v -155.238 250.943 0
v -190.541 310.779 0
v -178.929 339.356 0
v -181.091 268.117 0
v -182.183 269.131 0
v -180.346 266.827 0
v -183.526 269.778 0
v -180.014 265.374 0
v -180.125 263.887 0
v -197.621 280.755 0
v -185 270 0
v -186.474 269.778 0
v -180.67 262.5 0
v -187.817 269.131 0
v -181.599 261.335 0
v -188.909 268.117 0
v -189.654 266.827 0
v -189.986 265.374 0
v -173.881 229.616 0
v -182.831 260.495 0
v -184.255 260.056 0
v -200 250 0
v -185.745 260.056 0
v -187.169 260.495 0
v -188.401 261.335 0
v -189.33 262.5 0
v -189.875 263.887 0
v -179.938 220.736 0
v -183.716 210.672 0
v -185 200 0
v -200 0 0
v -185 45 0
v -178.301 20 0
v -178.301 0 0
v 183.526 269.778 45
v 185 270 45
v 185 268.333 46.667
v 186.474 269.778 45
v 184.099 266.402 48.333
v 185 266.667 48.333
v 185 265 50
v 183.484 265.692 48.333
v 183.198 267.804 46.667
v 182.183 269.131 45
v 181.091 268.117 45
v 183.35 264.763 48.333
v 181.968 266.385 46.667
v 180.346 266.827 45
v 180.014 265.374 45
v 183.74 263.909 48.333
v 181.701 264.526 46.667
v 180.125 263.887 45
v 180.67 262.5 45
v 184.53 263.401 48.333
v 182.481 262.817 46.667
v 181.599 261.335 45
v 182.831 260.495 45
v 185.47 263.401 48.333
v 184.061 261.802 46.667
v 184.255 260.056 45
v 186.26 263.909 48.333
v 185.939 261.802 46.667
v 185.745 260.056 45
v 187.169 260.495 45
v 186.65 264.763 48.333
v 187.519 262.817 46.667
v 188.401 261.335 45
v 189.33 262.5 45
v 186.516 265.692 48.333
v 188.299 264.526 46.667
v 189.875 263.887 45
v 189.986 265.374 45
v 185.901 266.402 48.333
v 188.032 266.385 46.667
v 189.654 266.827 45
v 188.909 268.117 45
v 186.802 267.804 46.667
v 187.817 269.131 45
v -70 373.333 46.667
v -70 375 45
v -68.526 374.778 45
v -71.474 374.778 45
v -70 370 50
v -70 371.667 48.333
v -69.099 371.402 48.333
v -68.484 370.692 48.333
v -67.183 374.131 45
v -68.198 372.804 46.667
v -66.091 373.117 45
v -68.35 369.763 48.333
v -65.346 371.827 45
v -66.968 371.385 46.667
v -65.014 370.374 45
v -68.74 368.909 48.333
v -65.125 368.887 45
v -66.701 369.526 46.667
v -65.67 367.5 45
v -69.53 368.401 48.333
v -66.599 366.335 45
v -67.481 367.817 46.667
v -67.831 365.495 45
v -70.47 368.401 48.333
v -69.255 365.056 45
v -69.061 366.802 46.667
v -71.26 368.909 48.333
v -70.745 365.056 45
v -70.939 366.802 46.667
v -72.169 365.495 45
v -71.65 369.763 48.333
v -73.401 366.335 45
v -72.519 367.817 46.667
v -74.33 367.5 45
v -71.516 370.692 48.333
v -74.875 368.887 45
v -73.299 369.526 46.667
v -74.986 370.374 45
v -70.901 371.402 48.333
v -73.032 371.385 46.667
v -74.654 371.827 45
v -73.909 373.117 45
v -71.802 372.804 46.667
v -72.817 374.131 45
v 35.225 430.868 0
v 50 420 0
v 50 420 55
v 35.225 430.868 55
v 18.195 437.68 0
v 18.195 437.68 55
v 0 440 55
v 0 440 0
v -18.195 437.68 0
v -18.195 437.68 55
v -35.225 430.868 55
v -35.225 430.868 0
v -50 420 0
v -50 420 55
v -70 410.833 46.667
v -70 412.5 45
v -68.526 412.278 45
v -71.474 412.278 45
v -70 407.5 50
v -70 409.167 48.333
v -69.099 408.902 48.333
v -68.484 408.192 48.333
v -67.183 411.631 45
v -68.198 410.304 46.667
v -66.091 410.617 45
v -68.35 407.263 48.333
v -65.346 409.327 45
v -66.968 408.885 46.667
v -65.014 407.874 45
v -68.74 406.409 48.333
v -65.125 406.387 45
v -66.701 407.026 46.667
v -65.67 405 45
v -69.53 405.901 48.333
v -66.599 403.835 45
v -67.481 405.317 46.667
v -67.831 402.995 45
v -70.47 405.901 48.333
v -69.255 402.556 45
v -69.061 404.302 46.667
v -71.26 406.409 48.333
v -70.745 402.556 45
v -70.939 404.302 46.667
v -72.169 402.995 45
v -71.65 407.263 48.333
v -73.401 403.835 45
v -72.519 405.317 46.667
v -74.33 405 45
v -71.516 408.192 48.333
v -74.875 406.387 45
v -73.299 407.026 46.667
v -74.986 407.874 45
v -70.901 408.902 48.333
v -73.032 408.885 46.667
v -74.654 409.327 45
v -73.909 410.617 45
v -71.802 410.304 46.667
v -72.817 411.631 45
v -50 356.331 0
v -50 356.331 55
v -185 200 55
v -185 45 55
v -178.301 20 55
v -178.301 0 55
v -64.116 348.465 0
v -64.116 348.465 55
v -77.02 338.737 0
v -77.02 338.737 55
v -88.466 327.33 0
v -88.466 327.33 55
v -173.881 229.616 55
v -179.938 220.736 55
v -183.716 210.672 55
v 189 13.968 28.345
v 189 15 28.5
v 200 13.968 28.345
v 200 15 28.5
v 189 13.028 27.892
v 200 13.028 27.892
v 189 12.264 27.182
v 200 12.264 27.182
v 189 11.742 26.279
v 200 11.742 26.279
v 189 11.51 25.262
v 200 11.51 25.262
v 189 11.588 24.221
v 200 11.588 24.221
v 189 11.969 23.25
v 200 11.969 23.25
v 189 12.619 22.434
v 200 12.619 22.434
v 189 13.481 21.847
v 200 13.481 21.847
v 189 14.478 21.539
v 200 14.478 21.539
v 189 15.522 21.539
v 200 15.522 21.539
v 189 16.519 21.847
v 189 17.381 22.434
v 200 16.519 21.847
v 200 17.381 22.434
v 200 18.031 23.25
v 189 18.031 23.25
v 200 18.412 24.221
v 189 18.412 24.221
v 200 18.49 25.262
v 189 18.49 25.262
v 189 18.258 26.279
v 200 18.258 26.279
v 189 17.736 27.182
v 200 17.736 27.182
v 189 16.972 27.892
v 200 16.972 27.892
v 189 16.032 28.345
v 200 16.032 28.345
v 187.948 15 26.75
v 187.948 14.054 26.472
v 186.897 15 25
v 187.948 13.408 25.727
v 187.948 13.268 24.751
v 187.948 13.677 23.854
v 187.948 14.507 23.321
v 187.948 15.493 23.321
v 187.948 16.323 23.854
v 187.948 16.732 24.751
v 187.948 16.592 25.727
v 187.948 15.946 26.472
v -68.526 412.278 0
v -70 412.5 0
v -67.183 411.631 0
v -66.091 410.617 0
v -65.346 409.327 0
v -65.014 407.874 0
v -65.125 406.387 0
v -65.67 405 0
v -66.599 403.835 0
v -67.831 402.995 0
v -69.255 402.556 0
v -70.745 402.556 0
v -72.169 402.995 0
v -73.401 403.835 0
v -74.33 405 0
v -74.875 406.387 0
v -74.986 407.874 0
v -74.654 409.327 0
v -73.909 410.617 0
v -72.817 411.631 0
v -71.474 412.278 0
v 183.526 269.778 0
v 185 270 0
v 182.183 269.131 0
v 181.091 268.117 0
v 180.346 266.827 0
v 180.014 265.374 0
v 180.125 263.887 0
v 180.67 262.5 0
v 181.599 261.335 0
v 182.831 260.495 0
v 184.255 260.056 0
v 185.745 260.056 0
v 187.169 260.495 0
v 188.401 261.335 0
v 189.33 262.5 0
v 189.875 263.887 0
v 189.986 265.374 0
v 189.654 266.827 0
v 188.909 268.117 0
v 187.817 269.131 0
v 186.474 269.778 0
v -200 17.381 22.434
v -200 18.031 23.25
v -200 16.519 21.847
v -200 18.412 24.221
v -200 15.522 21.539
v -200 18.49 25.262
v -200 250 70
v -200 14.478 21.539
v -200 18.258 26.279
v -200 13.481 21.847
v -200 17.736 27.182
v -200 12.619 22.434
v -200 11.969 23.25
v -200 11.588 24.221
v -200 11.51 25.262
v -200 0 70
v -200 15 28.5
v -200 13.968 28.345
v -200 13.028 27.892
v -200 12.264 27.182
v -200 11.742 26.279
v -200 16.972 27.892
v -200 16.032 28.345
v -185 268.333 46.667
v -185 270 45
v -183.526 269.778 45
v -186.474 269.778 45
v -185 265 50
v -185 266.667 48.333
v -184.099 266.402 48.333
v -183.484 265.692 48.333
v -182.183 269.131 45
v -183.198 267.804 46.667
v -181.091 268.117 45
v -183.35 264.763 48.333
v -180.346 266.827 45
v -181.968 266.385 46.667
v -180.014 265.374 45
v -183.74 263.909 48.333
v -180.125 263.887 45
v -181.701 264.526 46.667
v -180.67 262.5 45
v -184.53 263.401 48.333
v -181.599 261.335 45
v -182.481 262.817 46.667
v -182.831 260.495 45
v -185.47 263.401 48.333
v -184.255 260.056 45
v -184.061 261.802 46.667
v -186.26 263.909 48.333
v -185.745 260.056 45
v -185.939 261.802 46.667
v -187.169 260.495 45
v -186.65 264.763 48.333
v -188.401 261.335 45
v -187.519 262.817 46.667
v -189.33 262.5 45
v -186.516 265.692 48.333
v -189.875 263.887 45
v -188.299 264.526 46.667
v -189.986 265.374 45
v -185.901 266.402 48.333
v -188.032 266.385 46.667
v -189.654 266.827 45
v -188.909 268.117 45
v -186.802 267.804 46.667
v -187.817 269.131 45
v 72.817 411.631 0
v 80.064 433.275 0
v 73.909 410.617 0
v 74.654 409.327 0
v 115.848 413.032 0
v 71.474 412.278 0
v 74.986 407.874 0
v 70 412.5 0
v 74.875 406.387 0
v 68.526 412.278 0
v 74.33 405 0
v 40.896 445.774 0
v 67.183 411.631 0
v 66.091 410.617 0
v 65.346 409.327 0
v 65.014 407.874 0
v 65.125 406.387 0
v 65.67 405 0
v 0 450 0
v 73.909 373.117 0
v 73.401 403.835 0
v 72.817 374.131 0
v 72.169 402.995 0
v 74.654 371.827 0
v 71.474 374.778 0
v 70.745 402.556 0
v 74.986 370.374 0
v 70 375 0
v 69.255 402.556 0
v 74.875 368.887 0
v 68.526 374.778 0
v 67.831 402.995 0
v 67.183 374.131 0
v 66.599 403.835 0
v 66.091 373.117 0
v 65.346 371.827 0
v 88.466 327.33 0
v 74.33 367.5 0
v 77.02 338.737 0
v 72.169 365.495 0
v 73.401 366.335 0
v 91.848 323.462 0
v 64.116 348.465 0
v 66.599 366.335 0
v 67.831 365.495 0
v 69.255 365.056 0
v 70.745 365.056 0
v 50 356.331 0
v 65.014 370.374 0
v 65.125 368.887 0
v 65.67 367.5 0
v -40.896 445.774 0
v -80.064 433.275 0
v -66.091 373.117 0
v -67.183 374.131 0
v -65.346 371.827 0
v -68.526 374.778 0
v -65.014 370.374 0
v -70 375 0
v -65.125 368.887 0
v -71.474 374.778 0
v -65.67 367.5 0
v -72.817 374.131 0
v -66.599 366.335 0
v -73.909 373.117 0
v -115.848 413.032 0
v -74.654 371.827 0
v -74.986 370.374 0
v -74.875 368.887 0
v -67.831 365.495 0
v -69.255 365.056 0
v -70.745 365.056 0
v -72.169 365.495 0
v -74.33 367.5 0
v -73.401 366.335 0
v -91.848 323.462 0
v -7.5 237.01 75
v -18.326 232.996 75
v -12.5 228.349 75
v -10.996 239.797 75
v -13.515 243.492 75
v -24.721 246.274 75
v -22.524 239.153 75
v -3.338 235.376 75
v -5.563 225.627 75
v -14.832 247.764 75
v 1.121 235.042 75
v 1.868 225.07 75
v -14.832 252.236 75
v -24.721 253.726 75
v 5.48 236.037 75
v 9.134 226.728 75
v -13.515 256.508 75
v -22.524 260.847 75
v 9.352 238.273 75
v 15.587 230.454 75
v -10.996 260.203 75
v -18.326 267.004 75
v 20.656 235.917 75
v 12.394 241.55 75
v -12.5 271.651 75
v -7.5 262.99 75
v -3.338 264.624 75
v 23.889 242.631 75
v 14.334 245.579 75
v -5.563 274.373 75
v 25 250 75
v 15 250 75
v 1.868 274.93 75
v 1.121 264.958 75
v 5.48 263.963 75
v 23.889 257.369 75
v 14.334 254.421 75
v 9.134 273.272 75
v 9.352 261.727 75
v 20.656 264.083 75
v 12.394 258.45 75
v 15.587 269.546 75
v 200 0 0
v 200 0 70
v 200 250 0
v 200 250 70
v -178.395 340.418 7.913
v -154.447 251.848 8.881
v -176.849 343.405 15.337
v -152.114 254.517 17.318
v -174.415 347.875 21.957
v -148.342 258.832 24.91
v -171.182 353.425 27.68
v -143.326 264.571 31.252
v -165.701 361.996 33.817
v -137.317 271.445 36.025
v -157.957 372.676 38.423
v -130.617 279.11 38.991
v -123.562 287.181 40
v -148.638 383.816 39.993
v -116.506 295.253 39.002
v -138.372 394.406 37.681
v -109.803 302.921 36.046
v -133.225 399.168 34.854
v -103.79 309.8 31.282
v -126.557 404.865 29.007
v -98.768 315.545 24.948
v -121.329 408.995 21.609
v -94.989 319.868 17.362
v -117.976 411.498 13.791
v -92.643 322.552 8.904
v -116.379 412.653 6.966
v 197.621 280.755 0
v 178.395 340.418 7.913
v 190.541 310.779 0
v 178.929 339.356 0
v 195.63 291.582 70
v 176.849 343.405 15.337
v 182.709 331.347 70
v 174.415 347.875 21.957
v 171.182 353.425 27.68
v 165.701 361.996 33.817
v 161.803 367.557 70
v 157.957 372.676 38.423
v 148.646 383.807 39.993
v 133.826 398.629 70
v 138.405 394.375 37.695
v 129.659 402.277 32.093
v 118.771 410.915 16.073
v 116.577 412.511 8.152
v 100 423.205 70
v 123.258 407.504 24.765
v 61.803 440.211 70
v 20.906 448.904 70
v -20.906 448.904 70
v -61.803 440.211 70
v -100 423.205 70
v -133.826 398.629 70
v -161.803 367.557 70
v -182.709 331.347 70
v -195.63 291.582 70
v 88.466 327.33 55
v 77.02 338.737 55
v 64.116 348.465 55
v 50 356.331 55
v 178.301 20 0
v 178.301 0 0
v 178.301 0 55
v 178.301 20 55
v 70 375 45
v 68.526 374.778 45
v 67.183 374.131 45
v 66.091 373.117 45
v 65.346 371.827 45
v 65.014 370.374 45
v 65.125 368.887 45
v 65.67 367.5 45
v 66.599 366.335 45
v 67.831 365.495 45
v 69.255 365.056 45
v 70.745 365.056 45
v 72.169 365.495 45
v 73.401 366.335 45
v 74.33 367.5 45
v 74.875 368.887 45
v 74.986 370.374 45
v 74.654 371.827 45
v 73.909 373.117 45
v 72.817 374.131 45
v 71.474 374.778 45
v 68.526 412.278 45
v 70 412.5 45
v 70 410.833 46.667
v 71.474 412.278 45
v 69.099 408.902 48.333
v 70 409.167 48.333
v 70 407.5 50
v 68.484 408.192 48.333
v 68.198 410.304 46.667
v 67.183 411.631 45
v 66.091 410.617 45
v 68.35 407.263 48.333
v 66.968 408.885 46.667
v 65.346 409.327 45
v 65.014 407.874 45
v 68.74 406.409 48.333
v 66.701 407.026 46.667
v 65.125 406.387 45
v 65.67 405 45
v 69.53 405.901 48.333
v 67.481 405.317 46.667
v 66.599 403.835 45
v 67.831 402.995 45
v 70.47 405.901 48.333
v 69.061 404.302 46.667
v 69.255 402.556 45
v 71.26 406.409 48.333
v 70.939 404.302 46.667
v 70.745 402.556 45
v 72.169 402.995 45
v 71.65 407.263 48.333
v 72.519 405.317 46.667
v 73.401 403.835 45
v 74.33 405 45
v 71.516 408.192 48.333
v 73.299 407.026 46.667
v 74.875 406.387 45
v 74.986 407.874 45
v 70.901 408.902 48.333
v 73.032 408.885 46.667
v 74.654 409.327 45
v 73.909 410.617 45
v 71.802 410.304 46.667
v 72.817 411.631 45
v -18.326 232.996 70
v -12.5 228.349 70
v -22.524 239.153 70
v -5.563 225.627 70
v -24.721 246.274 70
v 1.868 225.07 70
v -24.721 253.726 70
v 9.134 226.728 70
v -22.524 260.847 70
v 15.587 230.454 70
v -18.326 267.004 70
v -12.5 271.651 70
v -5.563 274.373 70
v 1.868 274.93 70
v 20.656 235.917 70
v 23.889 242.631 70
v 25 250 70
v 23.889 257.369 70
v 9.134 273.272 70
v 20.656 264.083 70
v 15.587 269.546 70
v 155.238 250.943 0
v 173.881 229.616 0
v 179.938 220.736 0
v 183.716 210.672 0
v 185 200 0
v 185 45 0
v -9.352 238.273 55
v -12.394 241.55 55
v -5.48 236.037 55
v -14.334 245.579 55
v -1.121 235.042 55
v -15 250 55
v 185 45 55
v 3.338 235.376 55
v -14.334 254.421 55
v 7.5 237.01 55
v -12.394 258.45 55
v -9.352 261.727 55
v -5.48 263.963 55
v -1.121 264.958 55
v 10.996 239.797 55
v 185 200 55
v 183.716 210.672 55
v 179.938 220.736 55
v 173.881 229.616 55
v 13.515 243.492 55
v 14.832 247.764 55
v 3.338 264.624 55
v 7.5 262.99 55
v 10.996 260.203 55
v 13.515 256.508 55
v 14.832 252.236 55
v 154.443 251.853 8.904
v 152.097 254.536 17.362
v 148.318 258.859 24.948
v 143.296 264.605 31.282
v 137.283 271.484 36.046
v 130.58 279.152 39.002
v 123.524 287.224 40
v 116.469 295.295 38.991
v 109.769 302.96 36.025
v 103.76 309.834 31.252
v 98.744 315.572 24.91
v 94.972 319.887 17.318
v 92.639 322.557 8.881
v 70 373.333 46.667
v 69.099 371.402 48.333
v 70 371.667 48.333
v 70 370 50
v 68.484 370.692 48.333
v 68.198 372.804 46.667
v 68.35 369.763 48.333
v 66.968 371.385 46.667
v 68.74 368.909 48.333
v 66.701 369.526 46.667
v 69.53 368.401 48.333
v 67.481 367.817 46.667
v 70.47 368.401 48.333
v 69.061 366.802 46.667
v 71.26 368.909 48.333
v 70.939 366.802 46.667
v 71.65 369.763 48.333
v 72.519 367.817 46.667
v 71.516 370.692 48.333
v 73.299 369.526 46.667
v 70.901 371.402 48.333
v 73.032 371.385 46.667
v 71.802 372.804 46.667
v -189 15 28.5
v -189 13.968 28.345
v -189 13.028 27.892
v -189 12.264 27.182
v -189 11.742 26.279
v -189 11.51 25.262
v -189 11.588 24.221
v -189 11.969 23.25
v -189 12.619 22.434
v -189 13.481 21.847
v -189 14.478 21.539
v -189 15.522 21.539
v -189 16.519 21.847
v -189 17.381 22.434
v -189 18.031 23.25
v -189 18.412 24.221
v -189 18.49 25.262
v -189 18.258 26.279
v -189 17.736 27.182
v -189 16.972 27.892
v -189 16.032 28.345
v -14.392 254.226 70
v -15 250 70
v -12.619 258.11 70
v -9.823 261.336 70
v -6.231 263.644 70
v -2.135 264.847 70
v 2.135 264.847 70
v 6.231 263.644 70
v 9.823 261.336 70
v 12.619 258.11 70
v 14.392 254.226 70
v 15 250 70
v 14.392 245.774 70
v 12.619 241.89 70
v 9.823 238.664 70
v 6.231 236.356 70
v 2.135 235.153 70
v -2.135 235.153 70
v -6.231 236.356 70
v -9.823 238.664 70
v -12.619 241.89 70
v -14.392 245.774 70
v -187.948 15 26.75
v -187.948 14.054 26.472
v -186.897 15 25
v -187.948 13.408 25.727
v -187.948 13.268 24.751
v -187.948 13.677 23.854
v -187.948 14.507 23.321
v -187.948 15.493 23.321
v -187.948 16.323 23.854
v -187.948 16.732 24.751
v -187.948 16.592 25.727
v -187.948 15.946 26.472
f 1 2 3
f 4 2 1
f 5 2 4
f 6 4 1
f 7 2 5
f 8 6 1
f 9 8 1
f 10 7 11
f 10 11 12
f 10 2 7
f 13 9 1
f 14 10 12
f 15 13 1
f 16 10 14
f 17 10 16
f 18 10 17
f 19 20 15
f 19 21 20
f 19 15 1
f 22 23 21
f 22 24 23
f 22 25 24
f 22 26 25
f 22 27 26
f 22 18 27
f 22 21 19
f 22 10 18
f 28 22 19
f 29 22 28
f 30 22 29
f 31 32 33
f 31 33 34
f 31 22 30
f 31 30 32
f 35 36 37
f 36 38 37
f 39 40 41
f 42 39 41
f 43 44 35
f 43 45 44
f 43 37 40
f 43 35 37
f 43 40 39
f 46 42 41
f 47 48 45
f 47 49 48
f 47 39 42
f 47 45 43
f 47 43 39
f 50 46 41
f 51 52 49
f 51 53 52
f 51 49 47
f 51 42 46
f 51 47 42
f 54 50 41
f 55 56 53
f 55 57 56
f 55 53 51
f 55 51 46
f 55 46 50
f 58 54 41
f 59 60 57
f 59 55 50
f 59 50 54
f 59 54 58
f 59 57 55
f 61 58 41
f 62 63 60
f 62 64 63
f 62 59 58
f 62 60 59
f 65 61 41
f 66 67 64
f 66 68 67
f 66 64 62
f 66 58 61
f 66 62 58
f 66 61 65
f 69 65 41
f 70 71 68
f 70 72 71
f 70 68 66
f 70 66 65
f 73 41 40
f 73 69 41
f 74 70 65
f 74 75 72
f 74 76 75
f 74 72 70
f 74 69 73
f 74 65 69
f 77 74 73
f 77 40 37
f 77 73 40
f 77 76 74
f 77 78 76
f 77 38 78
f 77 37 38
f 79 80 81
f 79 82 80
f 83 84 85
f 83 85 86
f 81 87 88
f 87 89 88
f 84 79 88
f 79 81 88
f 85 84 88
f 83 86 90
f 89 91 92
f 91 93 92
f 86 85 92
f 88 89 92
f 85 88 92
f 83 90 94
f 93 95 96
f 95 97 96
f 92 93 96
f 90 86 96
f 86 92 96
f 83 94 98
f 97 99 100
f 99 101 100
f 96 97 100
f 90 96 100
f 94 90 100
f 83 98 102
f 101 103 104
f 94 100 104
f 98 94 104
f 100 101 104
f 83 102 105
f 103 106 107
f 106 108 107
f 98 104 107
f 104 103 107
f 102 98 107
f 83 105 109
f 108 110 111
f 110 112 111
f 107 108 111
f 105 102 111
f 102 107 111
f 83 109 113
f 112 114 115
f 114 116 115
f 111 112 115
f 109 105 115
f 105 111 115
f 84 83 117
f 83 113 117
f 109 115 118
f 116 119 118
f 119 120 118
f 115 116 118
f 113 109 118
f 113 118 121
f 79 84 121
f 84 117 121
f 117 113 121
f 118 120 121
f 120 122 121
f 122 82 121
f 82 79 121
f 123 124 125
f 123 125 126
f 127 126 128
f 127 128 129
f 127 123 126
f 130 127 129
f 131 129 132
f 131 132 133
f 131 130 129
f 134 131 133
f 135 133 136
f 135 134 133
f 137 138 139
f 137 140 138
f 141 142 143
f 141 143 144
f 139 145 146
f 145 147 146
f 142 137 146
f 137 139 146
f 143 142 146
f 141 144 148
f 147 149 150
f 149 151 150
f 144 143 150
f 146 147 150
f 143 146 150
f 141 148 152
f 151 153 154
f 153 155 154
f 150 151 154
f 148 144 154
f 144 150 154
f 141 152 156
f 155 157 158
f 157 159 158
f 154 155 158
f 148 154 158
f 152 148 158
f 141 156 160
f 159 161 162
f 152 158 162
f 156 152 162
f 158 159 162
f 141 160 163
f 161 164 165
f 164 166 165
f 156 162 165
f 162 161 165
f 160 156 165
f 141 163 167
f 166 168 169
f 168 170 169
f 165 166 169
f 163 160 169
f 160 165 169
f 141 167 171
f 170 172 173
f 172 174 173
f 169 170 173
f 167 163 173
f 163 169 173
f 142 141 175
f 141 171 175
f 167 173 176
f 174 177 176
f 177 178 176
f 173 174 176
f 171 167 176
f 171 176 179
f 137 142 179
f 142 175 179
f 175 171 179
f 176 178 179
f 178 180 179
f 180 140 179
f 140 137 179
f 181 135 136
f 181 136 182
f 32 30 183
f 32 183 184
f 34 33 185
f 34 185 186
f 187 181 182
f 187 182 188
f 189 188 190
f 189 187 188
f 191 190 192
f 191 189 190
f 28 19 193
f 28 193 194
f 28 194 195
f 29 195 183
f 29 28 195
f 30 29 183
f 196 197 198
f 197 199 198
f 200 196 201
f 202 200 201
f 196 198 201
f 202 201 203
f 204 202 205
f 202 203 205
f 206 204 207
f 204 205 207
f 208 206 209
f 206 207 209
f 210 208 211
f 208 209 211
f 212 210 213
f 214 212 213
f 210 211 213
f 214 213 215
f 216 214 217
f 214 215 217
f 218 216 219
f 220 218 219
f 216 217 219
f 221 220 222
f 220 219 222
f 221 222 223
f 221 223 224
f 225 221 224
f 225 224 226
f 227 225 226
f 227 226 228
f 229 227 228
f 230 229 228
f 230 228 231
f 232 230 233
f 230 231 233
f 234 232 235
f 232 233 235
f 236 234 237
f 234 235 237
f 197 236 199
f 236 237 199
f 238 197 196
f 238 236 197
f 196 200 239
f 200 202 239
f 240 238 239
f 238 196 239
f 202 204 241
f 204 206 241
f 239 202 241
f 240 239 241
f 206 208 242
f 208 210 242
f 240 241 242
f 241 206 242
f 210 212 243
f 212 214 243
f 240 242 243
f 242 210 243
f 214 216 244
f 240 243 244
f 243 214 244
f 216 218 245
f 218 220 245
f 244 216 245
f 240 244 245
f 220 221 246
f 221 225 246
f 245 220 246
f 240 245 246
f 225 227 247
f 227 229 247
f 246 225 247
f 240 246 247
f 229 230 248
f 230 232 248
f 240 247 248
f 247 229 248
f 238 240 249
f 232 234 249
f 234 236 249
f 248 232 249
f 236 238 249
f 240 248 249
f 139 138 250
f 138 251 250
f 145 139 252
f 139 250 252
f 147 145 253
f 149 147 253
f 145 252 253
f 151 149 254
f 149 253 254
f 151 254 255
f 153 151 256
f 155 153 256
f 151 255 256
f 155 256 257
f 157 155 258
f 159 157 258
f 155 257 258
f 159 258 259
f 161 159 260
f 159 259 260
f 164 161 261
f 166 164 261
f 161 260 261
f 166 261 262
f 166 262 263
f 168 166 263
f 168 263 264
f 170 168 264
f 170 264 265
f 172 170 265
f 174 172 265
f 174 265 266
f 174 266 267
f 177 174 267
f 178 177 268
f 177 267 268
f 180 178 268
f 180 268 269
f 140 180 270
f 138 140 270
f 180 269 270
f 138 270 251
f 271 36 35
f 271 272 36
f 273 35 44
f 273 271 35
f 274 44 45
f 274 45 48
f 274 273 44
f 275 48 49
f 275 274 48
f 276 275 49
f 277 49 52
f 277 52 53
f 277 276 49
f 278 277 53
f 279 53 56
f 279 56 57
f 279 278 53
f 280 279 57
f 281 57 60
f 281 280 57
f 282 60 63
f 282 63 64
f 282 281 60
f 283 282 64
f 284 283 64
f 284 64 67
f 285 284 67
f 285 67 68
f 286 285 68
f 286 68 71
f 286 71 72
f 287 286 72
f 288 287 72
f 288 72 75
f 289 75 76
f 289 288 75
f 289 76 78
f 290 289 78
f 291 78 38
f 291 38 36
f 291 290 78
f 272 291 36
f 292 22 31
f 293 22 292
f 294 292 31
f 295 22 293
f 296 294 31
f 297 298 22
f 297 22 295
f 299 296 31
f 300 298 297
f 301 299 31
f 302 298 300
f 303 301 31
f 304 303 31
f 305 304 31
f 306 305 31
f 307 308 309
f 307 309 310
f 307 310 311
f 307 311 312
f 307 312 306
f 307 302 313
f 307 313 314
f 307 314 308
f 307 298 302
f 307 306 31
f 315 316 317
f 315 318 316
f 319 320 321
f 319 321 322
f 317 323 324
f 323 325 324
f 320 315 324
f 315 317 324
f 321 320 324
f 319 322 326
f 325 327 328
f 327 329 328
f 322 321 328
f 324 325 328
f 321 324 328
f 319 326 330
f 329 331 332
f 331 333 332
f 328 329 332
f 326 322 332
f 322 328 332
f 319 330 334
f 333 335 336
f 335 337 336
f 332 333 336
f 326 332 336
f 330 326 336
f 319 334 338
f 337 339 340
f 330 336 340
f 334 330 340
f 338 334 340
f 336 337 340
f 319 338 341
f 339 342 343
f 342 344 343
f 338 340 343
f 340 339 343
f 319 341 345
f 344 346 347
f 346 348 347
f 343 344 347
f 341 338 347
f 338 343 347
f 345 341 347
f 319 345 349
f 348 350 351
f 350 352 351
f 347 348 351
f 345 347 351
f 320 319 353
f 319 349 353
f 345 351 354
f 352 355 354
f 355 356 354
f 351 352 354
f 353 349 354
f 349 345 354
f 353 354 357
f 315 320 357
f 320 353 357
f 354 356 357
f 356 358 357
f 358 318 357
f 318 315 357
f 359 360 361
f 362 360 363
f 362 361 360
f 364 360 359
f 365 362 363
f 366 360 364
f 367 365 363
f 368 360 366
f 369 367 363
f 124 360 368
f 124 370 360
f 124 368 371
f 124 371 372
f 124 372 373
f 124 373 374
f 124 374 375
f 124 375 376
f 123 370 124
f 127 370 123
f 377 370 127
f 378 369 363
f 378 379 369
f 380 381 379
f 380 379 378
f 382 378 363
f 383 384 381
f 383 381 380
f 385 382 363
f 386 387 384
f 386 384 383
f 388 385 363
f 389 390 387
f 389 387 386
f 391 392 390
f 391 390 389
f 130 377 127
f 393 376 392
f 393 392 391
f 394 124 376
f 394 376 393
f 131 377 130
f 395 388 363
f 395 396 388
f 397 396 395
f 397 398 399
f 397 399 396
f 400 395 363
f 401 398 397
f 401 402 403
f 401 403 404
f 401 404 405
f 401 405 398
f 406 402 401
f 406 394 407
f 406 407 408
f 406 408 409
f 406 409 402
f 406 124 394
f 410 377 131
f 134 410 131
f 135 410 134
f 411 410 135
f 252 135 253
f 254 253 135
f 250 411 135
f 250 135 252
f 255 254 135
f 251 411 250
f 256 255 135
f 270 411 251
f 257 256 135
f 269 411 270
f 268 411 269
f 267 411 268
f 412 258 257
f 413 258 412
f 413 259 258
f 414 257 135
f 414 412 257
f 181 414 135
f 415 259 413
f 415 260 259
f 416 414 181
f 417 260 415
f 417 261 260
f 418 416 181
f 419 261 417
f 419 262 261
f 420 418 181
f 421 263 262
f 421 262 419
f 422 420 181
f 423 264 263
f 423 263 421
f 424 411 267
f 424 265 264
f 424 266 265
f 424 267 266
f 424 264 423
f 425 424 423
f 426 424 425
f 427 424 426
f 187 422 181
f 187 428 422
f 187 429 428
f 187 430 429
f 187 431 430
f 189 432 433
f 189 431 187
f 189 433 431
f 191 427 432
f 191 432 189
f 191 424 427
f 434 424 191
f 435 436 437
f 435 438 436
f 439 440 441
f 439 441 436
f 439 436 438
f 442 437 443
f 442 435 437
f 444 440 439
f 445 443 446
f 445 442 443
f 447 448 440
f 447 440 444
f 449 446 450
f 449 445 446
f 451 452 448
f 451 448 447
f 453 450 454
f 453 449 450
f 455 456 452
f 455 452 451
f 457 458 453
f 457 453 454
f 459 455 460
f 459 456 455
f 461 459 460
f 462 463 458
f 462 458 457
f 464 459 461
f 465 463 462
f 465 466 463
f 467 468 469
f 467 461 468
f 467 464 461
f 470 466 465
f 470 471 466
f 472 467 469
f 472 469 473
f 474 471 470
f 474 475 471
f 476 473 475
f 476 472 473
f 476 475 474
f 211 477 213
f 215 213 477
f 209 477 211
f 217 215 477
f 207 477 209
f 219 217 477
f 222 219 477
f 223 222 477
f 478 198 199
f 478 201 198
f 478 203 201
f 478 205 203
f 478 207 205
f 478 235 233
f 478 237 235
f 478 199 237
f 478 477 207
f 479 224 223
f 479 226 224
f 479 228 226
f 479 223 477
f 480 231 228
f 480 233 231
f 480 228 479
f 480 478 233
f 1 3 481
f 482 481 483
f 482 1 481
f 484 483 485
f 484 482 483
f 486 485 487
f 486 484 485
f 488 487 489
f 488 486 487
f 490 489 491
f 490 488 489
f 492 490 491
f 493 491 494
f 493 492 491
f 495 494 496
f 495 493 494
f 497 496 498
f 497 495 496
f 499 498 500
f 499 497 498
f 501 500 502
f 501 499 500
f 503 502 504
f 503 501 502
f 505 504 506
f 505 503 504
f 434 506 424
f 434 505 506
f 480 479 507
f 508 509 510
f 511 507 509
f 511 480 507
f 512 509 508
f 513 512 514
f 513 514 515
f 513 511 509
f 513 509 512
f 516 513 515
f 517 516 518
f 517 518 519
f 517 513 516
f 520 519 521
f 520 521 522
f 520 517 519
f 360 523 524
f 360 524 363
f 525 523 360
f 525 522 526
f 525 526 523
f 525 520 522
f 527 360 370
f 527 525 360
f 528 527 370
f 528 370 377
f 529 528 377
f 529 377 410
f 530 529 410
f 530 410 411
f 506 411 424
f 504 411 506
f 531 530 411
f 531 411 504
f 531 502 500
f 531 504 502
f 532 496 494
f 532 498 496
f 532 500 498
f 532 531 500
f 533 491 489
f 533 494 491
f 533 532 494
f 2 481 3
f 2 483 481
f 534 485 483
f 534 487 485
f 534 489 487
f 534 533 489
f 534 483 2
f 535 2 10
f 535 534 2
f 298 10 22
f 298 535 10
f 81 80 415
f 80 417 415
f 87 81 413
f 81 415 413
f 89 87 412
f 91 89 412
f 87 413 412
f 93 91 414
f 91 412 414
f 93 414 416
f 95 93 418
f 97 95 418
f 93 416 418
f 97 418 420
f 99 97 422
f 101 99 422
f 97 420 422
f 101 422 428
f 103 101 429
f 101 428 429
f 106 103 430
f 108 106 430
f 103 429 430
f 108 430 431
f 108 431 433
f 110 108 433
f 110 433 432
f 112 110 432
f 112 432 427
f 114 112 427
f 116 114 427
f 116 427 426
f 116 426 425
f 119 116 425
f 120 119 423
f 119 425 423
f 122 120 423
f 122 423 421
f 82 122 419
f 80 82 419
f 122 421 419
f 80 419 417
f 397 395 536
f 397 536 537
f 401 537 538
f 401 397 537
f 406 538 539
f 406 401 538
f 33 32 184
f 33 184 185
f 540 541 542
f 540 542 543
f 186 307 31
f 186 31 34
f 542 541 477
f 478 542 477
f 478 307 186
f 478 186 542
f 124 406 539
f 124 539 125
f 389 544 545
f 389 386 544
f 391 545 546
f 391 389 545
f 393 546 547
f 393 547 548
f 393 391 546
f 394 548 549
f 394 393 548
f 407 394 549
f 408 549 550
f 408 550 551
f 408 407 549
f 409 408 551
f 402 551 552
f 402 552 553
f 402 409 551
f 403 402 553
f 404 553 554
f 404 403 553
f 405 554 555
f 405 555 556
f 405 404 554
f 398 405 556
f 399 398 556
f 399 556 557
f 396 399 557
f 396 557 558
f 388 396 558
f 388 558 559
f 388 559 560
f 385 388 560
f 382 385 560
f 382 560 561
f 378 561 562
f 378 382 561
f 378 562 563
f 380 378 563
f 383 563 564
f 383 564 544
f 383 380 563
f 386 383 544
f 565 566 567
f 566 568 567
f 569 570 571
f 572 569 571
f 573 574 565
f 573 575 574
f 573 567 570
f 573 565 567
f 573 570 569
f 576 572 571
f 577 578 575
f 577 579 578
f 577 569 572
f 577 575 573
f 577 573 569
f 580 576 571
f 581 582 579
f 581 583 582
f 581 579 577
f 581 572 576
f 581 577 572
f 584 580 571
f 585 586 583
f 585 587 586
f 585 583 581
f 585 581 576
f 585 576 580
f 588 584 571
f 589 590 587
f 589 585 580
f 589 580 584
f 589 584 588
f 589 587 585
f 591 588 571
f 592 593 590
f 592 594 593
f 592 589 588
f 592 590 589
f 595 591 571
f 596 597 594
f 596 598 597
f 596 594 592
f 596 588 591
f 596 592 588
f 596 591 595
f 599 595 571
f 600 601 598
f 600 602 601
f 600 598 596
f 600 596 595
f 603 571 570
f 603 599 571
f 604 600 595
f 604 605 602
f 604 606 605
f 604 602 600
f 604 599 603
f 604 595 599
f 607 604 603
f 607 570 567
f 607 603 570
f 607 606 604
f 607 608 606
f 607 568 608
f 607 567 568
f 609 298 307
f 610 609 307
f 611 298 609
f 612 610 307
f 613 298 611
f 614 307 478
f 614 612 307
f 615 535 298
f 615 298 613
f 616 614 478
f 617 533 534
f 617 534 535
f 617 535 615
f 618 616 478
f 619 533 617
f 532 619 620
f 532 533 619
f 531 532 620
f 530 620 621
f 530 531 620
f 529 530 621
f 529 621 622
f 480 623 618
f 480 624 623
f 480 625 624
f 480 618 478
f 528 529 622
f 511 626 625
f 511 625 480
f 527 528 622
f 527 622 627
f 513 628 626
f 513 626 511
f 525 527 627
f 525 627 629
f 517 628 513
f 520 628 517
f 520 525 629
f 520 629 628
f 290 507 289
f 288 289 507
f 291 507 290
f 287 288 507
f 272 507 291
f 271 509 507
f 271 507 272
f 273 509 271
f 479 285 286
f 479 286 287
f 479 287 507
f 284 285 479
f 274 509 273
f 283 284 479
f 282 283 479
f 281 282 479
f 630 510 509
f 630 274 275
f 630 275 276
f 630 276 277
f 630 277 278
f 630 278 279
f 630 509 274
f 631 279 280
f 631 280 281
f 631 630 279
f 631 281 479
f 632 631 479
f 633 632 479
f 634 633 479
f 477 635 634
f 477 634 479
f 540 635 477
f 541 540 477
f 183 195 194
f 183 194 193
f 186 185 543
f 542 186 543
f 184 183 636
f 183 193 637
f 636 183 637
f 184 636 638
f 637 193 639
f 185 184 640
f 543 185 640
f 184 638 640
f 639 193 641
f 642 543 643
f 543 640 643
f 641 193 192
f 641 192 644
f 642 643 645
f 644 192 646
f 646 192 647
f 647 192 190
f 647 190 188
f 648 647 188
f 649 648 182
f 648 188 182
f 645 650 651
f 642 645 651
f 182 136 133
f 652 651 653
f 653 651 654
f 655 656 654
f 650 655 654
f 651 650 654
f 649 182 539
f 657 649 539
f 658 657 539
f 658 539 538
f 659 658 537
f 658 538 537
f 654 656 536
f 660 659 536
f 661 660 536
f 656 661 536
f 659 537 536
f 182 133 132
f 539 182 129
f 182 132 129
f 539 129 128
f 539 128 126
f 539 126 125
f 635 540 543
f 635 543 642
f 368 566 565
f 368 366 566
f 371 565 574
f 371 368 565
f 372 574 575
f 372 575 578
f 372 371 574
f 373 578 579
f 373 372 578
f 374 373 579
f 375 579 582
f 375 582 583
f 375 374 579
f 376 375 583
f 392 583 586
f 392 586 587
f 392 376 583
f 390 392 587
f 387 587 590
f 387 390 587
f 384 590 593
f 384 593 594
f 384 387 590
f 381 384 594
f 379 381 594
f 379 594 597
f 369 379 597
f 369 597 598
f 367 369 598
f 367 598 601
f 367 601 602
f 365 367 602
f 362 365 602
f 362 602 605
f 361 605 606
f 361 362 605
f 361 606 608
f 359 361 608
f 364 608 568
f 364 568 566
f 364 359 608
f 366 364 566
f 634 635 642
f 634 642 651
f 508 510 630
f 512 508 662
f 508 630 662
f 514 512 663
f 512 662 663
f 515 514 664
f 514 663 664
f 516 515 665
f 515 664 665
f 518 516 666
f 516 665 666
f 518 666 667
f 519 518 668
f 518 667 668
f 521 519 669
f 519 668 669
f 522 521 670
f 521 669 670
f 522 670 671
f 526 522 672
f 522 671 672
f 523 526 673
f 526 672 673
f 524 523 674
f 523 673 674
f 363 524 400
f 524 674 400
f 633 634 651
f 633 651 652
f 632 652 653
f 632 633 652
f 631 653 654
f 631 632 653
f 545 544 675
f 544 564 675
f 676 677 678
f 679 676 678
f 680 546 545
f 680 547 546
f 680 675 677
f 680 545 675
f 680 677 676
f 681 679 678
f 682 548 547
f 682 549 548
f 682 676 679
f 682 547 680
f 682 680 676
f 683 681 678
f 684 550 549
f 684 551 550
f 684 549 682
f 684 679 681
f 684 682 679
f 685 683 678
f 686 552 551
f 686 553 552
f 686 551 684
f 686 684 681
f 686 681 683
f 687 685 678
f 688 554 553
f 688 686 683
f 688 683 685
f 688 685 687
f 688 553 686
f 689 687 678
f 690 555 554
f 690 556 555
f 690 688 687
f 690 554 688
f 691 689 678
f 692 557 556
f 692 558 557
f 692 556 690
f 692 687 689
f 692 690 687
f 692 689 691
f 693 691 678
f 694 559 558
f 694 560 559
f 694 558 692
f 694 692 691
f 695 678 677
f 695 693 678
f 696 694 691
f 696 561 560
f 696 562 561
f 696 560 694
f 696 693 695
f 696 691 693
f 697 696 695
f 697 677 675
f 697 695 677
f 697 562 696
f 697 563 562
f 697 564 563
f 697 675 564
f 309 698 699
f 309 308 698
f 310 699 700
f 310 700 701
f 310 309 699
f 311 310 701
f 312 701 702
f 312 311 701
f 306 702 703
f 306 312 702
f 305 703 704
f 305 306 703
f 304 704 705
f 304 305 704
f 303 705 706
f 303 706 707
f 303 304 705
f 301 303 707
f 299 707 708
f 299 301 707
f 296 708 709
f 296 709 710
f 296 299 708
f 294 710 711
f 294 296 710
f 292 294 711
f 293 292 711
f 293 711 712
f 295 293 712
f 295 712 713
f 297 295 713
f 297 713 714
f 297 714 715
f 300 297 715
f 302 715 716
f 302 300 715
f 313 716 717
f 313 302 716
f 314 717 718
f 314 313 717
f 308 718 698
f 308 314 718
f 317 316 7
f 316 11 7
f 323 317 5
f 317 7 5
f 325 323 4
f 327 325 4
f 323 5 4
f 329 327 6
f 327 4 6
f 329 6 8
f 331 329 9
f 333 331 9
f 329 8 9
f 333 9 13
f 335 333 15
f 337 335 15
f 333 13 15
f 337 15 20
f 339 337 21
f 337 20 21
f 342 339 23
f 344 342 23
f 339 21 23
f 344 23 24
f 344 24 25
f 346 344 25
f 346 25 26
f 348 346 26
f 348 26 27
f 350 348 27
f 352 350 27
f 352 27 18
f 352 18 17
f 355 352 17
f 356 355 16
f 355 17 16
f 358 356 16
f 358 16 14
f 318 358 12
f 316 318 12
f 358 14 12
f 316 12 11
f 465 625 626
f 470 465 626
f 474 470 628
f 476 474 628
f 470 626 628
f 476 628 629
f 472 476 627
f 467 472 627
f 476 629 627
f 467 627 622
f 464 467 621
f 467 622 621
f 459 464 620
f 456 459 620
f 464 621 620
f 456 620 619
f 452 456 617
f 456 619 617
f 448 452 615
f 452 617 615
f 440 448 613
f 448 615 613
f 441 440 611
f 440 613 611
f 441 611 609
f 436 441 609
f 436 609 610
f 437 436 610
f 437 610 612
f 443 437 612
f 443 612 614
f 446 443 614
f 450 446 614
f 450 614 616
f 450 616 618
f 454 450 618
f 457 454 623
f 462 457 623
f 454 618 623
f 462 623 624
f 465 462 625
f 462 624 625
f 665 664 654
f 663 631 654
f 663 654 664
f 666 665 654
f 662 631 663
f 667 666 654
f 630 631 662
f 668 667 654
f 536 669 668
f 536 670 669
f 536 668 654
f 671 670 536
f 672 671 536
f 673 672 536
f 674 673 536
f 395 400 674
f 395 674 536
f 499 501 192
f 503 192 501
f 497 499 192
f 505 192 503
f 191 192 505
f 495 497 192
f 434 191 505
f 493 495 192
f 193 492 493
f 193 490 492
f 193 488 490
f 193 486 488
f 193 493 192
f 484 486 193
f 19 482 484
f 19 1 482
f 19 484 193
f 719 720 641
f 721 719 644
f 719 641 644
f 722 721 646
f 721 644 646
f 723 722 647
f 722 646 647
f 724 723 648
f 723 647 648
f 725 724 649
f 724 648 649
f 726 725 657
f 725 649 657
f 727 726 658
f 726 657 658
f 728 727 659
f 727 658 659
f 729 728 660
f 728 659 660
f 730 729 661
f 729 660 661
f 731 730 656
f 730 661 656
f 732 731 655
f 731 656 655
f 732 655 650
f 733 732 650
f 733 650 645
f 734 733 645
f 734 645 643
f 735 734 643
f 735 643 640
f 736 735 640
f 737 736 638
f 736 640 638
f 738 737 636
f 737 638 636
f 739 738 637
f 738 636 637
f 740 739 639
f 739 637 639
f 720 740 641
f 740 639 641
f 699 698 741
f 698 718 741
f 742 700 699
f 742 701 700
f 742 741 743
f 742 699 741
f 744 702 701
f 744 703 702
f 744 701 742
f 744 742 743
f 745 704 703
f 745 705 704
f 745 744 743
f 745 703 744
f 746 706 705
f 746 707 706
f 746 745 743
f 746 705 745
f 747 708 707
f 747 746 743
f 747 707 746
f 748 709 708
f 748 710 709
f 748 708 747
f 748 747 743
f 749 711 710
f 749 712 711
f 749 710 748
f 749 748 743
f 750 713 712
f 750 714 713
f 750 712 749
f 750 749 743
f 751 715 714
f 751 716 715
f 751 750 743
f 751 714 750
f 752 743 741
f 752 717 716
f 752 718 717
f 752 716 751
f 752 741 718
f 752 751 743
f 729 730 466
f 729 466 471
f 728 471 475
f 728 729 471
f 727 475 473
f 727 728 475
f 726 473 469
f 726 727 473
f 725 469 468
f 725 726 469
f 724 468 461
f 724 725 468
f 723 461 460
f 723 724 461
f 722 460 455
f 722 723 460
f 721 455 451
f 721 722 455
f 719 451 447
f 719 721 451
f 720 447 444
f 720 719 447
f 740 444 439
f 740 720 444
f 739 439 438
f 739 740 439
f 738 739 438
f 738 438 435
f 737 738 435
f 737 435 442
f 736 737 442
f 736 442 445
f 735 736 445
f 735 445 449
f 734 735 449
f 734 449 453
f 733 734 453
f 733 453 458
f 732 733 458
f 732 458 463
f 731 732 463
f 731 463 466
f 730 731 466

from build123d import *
from build123d.topology import SkipClean

# Parameters (mm, degrees)
BOSS_EXTRUDE4_DEPTH             = 70
F_1_0MM_DOWEL_HOLE1_D           = 30
SKETCH4_R                       = 25
SKETCH4_R_2                     = 15
BOSS_EXTRUDE5_DEPTH             = 5
CUT_EXTRUDE4_DEPTH              = 499.121471129
CUT_EXTRUDE4_DEPTH_BACK         = 499.121471129
CUT_EXTRUDE5_DEPTH              = 55
F_10_0MM_DOWEL_HOLE1_AT_2_COUNT = 2
F_10_0MM_DOWEL_HOLE1_AT_2_PITCH = 155.724133524
F_10_0MM_DOWEL_HOLE1_AT_3_COUNT = 2
F_10_0MM_DOWEL_HOLE1_AT_3_PITCH = 183.115416505
CUT_EXTRUDE6_REACH              = 547.552
SKETCH22_R                      = 40


with BuildPart() as part:
    # Sketch2 → Boss-Extrude4 (new, symmetric)
    with BuildSketch(Plane.XY):
        with BuildLine():
            Line((-200, 0), (200, 0))
            Line((200, 0), (200, 250))
            ThreePointArc((200, 250), (0, 450), (-200, 250))
            Line((-200, 250), (-200, 0))
        make_face()
    extrude(amount=BOSS_EXTRUDE4_DEPTH, both=True)

    # Ø1.0mm Dowel Hole1 (through all)
    with Locations(Plane(origin=(0, 250, 70), x_dir=(1, 0, 0), z_dir=(0, 0, 1))):
        with Locations((0, 0)):
            Hole(F_1_0MM_DOWEL_HOLE1_D / 2)

    # Sketch4 → Boss-Extrude5 (add)
    with SkipClean():  # the faces are left unmerged after this step: merging them gives an invalid solid
        with BuildSketch(Plane.XY.offset(70)):
            with Locations((0, 250)):
                Circle(SKETCH4_R)
            with Locations((0, 250)):
                Circle(SKETCH4_R_2, mode=Mode.SUBTRACT)
        extrude(amount=BOSS_EXTRUDE5_DEPTH)
    add(part.part.scale(1), mode=Mode.REPLACE)  # the faces are merged on a copy

    # Sketch13 → Cut-Extrude4 (cut, two sides: drawn at the far end of the back side and taken through both)
    with BuildSketch(Plane(origin=(0, 0, 0), x_dir=(0, 0, -1), z_dir=(1, 0, 0)).offset(-CUT_EXTRUDE4_DEPTH_BACK)):
        Polygon((0, -922.414379545), (0, 0), (0, 450), (0, 1372.414379545), (1844.828759089, 1372.414379545), (1844.828759089, -922.414379545), align=None)
    extrude(amount=CUT_EXTRUDE4_DEPTH + CUT_EXTRUDE4_DEPTH_BACK, mode=Mode.SUBTRACT)

    # Sketch14 → Cut-Extrude5 (cut)
    with BuildSketch(Plane(origin=(0, 0, 0), x_dir=(-1, 0, 0), z_dir=(0, 0, -1))):
        with BuildLine():
            Line((-185, 45), (-185, 200))
            ThreePointArc((-185, 200), (-182.128554255, 215.817234791), (-173.880670381, 229.615877068))
            Line((-173.880670381, 229.615877068), (-88.466194885, 327.330345677))
            ThreePointArc((-88.466194885, 327.330345677), (-70.735263863, 343.823091221), (-49.999974949, 356.330863371))
            Line((-49.999974949, 356.330863371), (-49.999974949, 420.000023858))
            ThreePointArc((-49.999974949, 420.000023858), (0, 440), (49.999974949, 420.000023858))
            Line((49.999974949, 420.000023858), (49.999974949, 356.330863371))
            ThreePointArc((49.999974949, 356.330863371), (70.735263863, 343.823091221), (88.466194885, 327.330345677))
            Line((88.466194885, 327.330345677), (173.880670381, 229.615877068))
            ThreePointArc((173.880670381, 229.615877068), (182.128554255, 215.817234791), (185, 200))
            Line((185, 200), (185, 45))
            Line((185, 45), (178.301270189, 20))
            Line((178.301270189, 20), (178.301270189, 0))
            Line((178.301270189, 0), (-178.301270189, 0))
            Line((-178.301270189, 0), (-178.301270189, 20))
            Line((-178.301270189, 20), (-185, 45))
        make_face()
    extrude(amount=-CUT_EXTRUDE5_DEPTH, mode=Mode.SUBTRACT)

    # Sketch18 → M8x1.0 Tapped Hole1 (revolve, cut)
    with BuildSketch(Plane(origin=(-200, 15, 25), x_dir=(0, 0, 1), z_dir=(0, 1, 0))):
        Polygon((0, 0), (0, 13.103012167), (3.5, 11), (3.5, 0), align=None)
    m8x1_0_tapped_hole1 = revolve(axis=Axis((-206.35, 15, 25), (1, 0, 0)), mode=Mode.SUBTRACT)

    # Mirror2: M8x1.0 Tapped Hole1 across plane
    add(m8x1_0_tapped_hole1.mirror(Plane(origin=(0, 0, 0), x_dir=(0, 0, 1), z_dir=(1, 0, 0))), mode=Mode.SUBTRACT)

    # Sketch21 → Ø10.0mm Dowel Hole1 (revolve, cut)
    with BuildSketch(Plane(origin=(185, 265, 0), x_dir=(0, 1, 0), z_dir=(1, 0, 0))):
        Polygon((0, 0), (0, 50), (5, 45), (5, 0), align=None)
    f_10_0mm_dowel_hole1 = revolve(axis=Axis((185, 265, -6.35), (0, 0, 1)), mode=Mode.SUBTRACT)

    # Ø10.0mm Dowel Hole1 at 2: Ø10.0mm Dowel Hole1 ×2
    with Locations(*[Vector(-0.7384855670659363, 0.6742692839180076, 0) * (i * F_10_0MM_DOWEL_HOLE1_AT_2_PITCH) for i in range(1, F_10_0MM_DOWEL_HOLE1_AT_2_COUNT)]):
        add(f_10_0mm_dowel_hole1, mode=Mode.SUBTRACT)

    # Ø10.0mm Dowel Hole1 at 3: Ø10.0mm Dowel Hole1 ×2
    with Locations(*[Vector(-0.6280193511079233, 0.7781977220693871, 0) * (i * F_10_0MM_DOWEL_HOLE1_AT_3_PITCH) for i in range(1, F_10_0MM_DOWEL_HOLE1_AT_3_COUNT)]):
        add(f_10_0mm_dowel_hole1, mode=Mode.SUBTRACT)

    # Mirror3: Ø10.0mm Dowel Hole1 across plane
    add(f_10_0mm_dowel_hole1.mirror(Plane(origin=(0, 0, 0), x_dir=(0, 0, 1), z_dir=(1, 0, 0))), mode=Mode.SUBTRACT)

    # Mirror3 copy 1 sketch → Mirror3 copy 1 (revolve, cut)
    with BuildSketch(Plane(origin=(-69.999974949, 370, 0), x_dir=(0, 1, 0), z_dir=(-1, 0, 0))):
        Polygon((0, 0), (0, -50), (5, -45), (5, 0), align=None)
    revolve(axis=Axis((-69.999974949, 370, -6.35), (0, 0, -1)), mode=Mode.SUBTRACT)

    # Mirror3 copy 2 sketch → Mirror3 copy 2 (revolve, cut)
    with BuildSketch(Plane(origin=(-69.999974949, 407.5, 0), x_dir=(0, 1, 0), z_dir=(-1, 0, 0))):
        Polygon((0, 0), (0, -50), (5, -45), (5, 0), align=None)
    revolve(axis=Axis((-69.999974949, 407.5, -6.35), (0, 0, -1)), mode=Mode.SUBTRACT)

    # Cut-Extrude6: up to this plane
    cut_extrude6_end = Plane(origin=(-200, 0, 70), z_dir=(0, 1, 0))
    # Sketch22 → Cut-Extrude6 (cut, up to the surface)
    with BuildSketch(Plane(origin=(-114.263809021, 426.438340731, 0), x_dir=(0, 0, -1), z_dir=(-0.25881904510252135, 0.9659258262890681, 0)), mode=Mode.PRIVATE) as cut_extrude6_sk1:
        with Locations((0, 45)):
            Circle(SKETCH22_R)
    cut_extrude6_tool1 = split(extrude(cut_extrude6_sk1.sketch, amount=-CUT_EXTRUDE6_REACH, mode=Mode.PRIVATE), bisect_by=cut_extrude6_end, keep=Keep.BOTH, mode=Mode.PRIVATE)
    cut_extrude6 = cut_extrude6_tool1.solids().sort_by_distance((-157.730471, 414.791484, 0))[0]
    add(cut_extrude6, mode=Mode.SUBTRACT)

    # Mirror4: Cut-Extrude6 across plane
    add(cut_extrude6.mirror(Plane(origin=(0, 0, 0), x_dir=(0, 0, 1), z_dir=(1, 0, 0))), mode=Mode.SUBTRACT)


solid = part.part
